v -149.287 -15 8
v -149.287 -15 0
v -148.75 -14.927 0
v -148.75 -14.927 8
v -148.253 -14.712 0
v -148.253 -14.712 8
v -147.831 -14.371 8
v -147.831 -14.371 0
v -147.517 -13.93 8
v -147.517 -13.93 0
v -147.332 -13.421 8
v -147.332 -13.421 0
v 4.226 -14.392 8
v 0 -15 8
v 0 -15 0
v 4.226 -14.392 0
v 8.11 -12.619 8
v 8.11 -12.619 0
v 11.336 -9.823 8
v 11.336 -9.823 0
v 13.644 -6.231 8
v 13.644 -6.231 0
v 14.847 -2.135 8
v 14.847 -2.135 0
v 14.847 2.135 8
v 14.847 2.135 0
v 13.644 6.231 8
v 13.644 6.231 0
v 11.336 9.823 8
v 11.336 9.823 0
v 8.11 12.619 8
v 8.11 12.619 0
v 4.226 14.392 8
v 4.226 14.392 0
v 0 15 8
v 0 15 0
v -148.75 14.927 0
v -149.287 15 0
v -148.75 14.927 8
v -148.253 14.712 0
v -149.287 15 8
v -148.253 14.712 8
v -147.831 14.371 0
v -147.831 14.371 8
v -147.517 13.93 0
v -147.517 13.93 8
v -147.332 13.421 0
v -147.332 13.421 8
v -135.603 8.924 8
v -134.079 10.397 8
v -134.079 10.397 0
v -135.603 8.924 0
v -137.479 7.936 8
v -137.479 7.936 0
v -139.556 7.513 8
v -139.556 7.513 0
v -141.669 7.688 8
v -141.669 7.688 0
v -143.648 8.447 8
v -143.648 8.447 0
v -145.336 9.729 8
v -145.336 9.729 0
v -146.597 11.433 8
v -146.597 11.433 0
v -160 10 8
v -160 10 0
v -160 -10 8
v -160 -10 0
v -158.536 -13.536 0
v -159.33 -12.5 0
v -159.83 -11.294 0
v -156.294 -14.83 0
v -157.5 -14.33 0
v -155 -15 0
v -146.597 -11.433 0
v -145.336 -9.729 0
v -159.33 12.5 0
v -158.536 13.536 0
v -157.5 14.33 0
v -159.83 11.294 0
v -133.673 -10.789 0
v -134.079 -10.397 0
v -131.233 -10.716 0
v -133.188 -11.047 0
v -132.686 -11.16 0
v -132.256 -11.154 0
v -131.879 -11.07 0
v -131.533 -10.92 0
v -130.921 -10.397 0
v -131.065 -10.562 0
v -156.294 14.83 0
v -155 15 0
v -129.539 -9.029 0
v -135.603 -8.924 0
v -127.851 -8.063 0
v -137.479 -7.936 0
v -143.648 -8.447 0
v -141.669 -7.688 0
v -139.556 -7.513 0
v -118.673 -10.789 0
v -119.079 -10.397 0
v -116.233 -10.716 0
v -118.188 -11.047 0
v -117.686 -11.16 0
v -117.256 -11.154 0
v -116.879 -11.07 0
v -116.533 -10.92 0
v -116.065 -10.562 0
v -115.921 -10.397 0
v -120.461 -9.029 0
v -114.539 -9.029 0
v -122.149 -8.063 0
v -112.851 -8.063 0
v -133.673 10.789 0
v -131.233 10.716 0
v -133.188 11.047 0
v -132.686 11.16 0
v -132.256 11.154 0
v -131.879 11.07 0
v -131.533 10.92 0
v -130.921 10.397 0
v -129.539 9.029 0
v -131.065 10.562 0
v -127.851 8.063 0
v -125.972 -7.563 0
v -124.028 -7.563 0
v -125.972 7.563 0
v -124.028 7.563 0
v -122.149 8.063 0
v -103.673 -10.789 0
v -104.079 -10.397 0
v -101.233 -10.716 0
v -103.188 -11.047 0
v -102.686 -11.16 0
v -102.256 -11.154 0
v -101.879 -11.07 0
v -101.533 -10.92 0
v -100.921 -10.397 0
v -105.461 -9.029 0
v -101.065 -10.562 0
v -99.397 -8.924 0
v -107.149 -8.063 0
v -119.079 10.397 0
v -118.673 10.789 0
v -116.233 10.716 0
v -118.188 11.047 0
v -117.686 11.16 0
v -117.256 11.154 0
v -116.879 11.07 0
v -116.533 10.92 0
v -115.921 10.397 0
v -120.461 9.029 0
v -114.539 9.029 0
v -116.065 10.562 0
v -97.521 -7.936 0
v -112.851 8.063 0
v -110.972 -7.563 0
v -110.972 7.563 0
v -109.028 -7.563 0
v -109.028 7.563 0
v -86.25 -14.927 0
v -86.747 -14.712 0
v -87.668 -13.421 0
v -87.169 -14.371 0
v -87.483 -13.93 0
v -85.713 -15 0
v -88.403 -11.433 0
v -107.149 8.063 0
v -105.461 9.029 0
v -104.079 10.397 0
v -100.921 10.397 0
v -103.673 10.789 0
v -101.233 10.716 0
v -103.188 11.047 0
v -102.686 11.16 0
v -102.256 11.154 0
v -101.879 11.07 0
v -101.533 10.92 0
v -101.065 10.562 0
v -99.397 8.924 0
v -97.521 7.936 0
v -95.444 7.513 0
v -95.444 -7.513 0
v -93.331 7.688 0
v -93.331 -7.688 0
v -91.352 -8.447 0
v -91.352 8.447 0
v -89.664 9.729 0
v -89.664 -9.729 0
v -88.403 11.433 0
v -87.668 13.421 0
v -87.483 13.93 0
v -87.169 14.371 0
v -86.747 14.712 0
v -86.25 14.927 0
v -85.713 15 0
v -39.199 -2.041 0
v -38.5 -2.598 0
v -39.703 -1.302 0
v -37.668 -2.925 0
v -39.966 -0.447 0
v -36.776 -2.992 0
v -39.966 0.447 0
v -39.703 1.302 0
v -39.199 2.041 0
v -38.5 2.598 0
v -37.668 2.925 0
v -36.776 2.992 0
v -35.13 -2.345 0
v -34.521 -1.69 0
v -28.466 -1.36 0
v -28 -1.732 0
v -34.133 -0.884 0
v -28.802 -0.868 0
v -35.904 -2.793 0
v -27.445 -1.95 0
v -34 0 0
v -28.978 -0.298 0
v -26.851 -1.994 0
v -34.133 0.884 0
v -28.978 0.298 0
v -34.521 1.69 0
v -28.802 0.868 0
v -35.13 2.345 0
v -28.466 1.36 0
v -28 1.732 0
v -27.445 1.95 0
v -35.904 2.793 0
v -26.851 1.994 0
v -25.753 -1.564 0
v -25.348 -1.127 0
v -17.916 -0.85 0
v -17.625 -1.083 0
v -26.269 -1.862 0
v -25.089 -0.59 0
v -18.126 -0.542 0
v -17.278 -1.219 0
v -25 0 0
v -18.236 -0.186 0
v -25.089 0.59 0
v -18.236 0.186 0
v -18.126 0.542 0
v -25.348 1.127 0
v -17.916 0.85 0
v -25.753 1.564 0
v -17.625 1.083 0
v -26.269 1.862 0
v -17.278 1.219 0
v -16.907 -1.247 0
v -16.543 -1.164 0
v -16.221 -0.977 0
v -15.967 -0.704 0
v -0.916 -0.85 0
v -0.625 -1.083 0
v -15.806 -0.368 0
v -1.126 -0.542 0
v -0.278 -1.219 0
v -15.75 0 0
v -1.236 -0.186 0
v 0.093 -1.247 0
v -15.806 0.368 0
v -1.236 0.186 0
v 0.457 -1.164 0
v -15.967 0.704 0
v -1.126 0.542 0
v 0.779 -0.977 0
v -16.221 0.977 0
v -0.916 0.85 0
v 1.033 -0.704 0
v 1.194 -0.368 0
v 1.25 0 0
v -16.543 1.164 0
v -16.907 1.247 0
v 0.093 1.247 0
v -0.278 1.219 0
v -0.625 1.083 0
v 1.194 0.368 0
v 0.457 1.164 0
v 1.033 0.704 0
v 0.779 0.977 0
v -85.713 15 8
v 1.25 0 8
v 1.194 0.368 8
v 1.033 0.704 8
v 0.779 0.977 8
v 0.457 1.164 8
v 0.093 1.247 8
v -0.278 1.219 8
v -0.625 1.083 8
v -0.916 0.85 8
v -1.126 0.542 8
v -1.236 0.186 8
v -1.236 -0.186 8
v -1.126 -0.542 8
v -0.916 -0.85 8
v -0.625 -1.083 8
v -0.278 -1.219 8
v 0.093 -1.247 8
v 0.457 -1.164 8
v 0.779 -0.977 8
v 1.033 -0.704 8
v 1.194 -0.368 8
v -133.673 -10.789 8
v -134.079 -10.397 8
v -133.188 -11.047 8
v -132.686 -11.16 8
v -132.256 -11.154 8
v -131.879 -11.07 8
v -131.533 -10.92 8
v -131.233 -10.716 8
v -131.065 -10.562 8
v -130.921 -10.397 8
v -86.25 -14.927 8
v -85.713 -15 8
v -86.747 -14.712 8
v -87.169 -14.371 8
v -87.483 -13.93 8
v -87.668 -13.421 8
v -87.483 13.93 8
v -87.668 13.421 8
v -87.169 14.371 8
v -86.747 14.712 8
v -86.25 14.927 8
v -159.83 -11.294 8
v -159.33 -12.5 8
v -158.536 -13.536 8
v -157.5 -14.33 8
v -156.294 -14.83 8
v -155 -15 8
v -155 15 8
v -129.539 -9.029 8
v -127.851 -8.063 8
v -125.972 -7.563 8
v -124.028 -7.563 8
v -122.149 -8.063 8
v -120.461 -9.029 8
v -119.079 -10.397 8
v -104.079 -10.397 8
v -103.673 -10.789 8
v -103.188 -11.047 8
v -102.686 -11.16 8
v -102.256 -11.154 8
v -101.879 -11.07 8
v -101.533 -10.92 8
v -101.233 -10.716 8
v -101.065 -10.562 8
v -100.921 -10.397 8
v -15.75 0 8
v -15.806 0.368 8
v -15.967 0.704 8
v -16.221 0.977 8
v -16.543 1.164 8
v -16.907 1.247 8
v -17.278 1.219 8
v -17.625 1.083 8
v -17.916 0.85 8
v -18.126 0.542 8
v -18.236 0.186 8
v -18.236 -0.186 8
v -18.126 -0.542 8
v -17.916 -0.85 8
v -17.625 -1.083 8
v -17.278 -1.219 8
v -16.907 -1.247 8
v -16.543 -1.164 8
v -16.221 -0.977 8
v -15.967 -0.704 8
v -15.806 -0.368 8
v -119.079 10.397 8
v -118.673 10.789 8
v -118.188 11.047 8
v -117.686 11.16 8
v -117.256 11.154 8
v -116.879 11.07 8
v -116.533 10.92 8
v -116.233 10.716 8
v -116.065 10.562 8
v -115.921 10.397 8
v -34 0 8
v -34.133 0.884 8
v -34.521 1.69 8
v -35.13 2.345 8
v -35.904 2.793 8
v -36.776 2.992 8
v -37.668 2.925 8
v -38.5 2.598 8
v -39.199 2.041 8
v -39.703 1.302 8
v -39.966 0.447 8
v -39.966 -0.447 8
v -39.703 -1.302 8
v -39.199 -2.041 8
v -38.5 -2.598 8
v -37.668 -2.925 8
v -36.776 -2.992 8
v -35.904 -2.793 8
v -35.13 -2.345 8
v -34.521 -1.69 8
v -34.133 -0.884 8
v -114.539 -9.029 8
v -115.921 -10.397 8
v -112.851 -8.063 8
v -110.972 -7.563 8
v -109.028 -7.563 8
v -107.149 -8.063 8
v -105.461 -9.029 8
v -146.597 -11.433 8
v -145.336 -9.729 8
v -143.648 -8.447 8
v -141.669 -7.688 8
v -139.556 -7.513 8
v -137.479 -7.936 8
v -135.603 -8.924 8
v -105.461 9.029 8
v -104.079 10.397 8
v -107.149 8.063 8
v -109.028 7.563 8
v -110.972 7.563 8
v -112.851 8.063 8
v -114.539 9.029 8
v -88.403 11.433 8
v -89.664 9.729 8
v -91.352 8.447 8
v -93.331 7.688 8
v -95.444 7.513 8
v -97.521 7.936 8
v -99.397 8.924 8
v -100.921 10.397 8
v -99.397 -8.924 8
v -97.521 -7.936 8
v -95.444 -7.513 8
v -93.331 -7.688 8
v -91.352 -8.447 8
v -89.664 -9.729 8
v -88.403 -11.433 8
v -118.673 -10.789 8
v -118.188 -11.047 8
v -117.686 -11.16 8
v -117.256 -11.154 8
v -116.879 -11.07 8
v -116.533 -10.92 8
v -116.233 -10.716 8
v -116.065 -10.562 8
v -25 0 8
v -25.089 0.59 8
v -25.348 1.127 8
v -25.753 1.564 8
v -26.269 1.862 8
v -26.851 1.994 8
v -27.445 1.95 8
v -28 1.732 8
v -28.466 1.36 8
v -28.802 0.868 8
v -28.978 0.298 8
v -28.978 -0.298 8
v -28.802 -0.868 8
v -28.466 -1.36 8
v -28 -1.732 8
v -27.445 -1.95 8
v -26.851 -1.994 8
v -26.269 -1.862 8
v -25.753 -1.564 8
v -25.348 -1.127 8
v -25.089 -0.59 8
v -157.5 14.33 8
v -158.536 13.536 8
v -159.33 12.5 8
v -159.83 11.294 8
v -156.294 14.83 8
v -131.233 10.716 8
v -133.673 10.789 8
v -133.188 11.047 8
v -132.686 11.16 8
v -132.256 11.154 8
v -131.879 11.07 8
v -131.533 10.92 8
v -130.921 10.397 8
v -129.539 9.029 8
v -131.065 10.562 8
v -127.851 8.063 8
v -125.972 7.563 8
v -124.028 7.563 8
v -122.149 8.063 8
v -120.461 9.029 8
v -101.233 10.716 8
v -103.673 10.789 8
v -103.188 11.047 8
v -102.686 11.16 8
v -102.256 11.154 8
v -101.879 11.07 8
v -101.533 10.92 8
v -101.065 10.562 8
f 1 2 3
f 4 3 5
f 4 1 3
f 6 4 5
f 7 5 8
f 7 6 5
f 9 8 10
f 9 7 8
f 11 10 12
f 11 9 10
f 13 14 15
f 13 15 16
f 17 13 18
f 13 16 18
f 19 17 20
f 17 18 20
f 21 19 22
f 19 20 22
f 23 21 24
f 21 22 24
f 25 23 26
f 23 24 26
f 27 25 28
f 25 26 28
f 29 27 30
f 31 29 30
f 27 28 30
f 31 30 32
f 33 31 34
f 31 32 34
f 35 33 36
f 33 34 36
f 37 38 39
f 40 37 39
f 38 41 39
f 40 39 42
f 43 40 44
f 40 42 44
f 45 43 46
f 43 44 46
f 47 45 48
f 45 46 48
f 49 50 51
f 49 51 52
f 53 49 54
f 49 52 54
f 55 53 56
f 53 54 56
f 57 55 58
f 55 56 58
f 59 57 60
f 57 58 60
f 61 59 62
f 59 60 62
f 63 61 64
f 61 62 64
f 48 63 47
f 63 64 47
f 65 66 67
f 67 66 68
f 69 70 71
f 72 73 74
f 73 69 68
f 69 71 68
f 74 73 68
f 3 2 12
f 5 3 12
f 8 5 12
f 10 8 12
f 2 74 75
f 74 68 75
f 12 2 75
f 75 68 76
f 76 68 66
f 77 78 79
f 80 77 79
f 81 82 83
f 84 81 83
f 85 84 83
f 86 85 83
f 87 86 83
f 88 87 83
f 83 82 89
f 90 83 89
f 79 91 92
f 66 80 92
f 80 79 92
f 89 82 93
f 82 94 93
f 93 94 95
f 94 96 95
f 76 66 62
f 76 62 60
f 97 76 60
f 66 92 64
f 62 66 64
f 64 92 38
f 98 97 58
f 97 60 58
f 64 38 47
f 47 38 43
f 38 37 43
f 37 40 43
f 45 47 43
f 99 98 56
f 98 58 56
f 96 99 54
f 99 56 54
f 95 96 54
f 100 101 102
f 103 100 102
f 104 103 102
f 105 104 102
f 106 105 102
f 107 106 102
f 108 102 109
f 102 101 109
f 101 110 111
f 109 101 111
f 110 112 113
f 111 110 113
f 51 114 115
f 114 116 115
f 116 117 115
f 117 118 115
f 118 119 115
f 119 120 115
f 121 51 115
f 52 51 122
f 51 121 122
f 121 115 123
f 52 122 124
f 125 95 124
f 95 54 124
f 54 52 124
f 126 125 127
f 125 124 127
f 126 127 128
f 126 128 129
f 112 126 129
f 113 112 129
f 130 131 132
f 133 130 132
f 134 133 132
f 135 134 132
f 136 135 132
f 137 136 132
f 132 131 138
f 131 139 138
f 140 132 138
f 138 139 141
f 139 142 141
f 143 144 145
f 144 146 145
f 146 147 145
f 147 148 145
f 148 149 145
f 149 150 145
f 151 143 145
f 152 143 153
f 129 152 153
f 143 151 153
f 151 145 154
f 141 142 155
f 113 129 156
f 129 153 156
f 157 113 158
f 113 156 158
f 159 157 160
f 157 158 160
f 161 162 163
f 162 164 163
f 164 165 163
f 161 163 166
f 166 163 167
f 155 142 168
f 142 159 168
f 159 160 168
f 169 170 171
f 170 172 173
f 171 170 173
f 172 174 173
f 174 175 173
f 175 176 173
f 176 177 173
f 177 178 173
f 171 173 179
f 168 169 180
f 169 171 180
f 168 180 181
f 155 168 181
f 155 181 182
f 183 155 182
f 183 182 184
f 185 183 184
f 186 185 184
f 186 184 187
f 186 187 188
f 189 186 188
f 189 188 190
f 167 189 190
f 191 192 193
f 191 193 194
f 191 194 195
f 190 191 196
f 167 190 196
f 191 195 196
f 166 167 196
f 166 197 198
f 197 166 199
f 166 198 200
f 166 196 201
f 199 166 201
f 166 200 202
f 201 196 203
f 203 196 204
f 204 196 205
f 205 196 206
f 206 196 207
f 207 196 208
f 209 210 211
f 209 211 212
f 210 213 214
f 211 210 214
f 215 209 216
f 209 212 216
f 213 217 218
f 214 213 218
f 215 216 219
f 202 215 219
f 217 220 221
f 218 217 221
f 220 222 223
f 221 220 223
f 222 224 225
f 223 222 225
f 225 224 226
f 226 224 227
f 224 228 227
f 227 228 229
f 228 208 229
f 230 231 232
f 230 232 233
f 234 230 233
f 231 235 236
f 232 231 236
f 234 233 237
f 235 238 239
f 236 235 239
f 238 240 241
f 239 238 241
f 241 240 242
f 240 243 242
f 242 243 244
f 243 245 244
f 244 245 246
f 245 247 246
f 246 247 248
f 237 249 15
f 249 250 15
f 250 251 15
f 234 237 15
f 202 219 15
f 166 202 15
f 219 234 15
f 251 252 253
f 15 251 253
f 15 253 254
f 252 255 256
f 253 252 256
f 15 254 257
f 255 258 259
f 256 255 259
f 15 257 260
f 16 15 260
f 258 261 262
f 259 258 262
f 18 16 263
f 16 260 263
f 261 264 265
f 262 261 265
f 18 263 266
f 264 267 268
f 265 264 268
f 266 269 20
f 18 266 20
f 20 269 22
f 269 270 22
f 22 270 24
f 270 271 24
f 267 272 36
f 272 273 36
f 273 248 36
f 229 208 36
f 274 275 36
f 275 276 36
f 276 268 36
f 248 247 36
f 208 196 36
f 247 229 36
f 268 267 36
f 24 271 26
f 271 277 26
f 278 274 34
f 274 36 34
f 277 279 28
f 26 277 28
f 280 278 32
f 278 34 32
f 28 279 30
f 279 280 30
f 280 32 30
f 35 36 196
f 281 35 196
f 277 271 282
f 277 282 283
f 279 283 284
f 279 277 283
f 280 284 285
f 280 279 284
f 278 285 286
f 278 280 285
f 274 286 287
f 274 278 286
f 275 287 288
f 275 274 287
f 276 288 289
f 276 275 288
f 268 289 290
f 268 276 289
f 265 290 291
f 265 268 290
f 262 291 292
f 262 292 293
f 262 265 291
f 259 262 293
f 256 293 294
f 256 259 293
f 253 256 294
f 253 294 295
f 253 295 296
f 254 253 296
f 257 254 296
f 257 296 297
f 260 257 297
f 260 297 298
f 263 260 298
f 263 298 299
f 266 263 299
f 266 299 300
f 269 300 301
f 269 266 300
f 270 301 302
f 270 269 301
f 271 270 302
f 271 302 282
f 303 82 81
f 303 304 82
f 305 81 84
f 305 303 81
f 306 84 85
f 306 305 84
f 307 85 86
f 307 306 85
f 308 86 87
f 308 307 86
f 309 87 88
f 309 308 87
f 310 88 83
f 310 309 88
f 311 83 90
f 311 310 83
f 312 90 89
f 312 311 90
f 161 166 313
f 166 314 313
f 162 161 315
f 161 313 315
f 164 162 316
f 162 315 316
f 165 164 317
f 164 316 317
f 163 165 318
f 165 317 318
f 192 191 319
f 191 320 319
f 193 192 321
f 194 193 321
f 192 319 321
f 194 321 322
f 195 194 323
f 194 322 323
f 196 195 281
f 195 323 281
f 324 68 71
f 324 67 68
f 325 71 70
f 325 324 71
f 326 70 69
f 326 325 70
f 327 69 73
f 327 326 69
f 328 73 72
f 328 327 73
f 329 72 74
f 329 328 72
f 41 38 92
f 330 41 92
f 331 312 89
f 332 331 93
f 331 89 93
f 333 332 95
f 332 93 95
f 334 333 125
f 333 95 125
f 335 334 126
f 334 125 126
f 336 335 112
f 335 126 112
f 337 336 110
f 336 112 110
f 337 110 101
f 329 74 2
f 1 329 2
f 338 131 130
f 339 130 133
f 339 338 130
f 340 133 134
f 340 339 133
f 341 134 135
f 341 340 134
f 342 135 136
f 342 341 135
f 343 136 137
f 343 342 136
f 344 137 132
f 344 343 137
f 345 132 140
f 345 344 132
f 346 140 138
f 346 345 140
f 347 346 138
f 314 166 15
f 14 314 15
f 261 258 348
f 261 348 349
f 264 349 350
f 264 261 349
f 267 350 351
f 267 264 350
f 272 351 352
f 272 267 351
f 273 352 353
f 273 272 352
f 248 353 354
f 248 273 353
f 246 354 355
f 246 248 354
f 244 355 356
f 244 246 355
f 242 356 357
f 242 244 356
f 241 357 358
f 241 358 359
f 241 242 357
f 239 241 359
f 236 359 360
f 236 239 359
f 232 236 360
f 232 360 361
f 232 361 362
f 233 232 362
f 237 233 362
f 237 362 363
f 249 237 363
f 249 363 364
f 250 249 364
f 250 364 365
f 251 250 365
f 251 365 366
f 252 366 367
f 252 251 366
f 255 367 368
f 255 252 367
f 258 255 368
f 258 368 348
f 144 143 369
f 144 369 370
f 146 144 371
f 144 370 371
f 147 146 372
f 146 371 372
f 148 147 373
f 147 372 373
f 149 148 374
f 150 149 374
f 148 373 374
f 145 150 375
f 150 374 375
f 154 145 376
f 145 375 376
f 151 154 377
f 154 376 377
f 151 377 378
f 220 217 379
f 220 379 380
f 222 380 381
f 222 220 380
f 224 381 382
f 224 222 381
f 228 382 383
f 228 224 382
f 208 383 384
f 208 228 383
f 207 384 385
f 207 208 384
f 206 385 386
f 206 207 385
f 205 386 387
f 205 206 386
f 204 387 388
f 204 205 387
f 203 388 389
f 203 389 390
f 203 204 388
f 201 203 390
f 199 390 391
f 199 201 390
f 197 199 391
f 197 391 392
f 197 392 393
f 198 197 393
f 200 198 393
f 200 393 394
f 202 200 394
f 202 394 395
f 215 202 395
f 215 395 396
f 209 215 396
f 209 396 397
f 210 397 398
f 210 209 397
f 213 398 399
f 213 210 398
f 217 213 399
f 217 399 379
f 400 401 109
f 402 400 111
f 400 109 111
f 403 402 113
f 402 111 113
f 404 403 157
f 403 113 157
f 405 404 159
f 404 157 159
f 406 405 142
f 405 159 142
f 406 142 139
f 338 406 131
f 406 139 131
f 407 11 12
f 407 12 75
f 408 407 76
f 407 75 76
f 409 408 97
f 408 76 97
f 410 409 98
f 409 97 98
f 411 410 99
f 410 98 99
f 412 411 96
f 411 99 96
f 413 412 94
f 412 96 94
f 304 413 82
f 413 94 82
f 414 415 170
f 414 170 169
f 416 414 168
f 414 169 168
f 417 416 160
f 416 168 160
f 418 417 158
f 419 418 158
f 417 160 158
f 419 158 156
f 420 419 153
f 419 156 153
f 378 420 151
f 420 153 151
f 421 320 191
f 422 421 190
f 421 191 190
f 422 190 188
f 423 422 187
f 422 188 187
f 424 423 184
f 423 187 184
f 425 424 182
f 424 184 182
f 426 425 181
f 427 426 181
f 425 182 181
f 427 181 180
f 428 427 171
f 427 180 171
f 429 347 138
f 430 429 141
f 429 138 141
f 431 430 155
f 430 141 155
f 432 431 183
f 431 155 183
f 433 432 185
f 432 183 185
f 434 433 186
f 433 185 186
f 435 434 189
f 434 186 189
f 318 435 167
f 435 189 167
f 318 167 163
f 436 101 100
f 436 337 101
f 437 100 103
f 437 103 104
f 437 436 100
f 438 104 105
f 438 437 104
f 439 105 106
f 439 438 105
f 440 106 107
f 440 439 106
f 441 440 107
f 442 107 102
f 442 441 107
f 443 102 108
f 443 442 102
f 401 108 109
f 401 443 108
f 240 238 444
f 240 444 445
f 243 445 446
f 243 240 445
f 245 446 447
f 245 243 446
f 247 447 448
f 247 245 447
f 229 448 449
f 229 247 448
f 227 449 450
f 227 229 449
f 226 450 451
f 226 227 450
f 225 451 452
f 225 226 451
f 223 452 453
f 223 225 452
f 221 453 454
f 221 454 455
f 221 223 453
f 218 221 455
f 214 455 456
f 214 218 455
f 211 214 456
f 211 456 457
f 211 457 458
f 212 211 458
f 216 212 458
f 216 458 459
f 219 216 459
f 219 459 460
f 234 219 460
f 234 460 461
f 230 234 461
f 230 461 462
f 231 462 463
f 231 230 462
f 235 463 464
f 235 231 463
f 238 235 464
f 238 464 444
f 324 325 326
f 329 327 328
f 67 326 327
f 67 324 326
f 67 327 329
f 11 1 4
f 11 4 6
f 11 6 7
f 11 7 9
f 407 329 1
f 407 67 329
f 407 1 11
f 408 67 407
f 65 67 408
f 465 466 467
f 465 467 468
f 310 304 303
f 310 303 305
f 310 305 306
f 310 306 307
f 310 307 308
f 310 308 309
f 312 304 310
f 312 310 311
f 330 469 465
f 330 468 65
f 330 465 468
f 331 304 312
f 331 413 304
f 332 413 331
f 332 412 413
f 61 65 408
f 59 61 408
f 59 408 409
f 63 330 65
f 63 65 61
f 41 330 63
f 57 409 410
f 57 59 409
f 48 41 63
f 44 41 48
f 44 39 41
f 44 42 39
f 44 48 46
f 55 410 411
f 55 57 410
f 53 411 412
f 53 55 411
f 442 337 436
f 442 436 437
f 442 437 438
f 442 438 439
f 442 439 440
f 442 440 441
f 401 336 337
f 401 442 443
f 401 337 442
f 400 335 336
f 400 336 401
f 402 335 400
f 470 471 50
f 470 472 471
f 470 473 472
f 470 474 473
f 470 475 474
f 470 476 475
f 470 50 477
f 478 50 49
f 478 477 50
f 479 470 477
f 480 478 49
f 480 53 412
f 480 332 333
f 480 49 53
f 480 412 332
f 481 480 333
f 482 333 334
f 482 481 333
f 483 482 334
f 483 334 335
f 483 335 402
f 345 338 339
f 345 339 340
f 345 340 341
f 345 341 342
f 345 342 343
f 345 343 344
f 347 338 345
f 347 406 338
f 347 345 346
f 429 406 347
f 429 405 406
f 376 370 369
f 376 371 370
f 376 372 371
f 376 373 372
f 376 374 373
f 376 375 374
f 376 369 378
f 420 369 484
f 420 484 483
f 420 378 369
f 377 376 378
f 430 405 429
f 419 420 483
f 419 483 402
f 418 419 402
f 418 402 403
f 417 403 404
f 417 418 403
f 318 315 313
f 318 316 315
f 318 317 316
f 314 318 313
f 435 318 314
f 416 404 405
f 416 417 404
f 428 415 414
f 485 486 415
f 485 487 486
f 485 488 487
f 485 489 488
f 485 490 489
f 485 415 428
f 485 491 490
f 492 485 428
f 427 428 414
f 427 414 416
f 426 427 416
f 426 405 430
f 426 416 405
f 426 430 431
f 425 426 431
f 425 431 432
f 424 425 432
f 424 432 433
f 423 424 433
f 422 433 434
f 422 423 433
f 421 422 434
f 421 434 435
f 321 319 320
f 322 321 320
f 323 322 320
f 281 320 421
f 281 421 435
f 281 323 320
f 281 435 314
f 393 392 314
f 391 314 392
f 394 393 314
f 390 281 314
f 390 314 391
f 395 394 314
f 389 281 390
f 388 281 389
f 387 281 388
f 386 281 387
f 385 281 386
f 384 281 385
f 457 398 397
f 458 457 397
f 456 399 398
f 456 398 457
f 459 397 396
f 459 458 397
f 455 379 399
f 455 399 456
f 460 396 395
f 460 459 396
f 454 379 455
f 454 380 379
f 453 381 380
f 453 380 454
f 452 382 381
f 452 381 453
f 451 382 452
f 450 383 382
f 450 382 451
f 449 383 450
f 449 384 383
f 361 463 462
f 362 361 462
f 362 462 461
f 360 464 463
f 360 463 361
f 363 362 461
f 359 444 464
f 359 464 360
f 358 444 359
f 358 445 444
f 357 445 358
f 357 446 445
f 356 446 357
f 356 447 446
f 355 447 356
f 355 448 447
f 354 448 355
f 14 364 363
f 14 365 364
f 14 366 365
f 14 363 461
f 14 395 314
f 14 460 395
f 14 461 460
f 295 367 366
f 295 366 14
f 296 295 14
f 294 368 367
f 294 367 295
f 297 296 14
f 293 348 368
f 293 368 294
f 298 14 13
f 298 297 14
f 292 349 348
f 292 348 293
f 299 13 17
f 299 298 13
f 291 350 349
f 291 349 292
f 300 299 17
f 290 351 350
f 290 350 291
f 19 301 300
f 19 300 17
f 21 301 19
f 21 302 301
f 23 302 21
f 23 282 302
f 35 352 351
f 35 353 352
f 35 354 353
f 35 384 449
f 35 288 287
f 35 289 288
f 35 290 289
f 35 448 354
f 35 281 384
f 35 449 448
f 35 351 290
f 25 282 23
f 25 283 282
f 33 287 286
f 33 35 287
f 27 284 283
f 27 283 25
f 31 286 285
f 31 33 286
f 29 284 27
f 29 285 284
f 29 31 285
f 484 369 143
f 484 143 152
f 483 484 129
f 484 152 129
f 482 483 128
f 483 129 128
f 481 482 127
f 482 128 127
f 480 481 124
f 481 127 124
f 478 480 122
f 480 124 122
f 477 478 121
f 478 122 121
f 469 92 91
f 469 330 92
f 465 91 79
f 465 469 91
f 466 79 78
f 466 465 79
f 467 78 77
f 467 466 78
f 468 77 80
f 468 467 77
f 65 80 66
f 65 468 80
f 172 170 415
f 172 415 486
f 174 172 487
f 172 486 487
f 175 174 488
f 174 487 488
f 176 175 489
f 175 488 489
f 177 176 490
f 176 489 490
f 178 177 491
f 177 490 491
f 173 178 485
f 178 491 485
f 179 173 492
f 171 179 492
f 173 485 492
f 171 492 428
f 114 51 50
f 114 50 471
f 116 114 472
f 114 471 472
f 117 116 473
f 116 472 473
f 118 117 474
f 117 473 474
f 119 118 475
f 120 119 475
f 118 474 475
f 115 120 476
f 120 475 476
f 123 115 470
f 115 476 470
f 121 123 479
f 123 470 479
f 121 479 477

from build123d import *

# Parameters (mm, degrees)
SKETCH1_R           = 1.25
SKETCH1_R_2         = 3
SKETCH1_R_3         = 2
BOSS_EXTRUDE1_DEPTH = 8
FILLET1_R           = 5
FILLET2_R           = 2


with BuildPart() as part:
    # Sketch1 → Boss-Extrude1 (new body)
    with BuildSketch(Plane.XY):
        with BuildLine():
            Line((0, 15), (-87.5, 15))
            ThreePointArc((-87.5, 15), (-95, 7.5), (-102.5, 15))
            ThreePointArc((-102.5, 15), (-110, 7.5), (-117.5, 15))
            ThreePointArc((-117.5, 15), (-125, 7.5), (-132.5, 15))
            ThreePointArc((-132.5, 15), (-140, 7.5), (-147.5, 15))
            Line((-147.5, 15), (-160, 15))
            Line((-160, 15), (-160, -15))
            Line((-160, -15), (-147.5, -15))
            ThreePointArc((-147.5, -15), (-140, -7.5), (-132.5, -15))
            ThreePointArc((-132.5, -15), (-125, -7.5), (-117.5, -15))
            ThreePointArc((-117.5, -15), (-110, -7.5), (-102.5, -15))
            ThreePointArc((-102.5, -15), (-95, -7.5), (-87.5, -15))
            Line((-87.5, -15), (0, -15))
            ThreePointArc((0, -15), (15, 0), (0, 15))
        make_face()
        Circle(SKETCH1_R, mode=Mode.SUBTRACT)
        with Locations((-17, 0)):
            Circle(SKETCH1_R, mode=Mode.SUBTRACT)
        with Locations((-37, 0)):
            Circle(SKETCH1_R_2, mode=Mode.SUBTRACT)
        with Locations((-27, 0)):
            Circle(SKETCH1_R_3, mode=Mode.SUBTRACT)
    extrude(amount=BOSS_EXTRUDE1_DEPTH)

    # Fillet1
    fillet1_edges = [part.edges().sort_by_distance(p)[0] for p in [
        (-160, -15, 4),
        (-160, 15, 4),
    ]]
    fillet(fillet1_edges, radius=FILLET1_R)

    # Fillet2
    fillet2_edges = [part.edges().sort_by_distance(p)[0] for p in [
        (-87.5, -15, 4),
        (-102.5, -15, 4),
        (-117.5, -15, 4),
        (-132.5, -15, 4),
        (-147.5, -15, 4),
        (-147.5, 15, 4),
        (-132.5, 15, 4),
        (-117.5, 15, 4),
        (-102.5, 15, 4),
        (-87.5, 15, 4),
    ]]
    fillet(fillet2_edges, radius=FILLET2_R)


solid = part.part
